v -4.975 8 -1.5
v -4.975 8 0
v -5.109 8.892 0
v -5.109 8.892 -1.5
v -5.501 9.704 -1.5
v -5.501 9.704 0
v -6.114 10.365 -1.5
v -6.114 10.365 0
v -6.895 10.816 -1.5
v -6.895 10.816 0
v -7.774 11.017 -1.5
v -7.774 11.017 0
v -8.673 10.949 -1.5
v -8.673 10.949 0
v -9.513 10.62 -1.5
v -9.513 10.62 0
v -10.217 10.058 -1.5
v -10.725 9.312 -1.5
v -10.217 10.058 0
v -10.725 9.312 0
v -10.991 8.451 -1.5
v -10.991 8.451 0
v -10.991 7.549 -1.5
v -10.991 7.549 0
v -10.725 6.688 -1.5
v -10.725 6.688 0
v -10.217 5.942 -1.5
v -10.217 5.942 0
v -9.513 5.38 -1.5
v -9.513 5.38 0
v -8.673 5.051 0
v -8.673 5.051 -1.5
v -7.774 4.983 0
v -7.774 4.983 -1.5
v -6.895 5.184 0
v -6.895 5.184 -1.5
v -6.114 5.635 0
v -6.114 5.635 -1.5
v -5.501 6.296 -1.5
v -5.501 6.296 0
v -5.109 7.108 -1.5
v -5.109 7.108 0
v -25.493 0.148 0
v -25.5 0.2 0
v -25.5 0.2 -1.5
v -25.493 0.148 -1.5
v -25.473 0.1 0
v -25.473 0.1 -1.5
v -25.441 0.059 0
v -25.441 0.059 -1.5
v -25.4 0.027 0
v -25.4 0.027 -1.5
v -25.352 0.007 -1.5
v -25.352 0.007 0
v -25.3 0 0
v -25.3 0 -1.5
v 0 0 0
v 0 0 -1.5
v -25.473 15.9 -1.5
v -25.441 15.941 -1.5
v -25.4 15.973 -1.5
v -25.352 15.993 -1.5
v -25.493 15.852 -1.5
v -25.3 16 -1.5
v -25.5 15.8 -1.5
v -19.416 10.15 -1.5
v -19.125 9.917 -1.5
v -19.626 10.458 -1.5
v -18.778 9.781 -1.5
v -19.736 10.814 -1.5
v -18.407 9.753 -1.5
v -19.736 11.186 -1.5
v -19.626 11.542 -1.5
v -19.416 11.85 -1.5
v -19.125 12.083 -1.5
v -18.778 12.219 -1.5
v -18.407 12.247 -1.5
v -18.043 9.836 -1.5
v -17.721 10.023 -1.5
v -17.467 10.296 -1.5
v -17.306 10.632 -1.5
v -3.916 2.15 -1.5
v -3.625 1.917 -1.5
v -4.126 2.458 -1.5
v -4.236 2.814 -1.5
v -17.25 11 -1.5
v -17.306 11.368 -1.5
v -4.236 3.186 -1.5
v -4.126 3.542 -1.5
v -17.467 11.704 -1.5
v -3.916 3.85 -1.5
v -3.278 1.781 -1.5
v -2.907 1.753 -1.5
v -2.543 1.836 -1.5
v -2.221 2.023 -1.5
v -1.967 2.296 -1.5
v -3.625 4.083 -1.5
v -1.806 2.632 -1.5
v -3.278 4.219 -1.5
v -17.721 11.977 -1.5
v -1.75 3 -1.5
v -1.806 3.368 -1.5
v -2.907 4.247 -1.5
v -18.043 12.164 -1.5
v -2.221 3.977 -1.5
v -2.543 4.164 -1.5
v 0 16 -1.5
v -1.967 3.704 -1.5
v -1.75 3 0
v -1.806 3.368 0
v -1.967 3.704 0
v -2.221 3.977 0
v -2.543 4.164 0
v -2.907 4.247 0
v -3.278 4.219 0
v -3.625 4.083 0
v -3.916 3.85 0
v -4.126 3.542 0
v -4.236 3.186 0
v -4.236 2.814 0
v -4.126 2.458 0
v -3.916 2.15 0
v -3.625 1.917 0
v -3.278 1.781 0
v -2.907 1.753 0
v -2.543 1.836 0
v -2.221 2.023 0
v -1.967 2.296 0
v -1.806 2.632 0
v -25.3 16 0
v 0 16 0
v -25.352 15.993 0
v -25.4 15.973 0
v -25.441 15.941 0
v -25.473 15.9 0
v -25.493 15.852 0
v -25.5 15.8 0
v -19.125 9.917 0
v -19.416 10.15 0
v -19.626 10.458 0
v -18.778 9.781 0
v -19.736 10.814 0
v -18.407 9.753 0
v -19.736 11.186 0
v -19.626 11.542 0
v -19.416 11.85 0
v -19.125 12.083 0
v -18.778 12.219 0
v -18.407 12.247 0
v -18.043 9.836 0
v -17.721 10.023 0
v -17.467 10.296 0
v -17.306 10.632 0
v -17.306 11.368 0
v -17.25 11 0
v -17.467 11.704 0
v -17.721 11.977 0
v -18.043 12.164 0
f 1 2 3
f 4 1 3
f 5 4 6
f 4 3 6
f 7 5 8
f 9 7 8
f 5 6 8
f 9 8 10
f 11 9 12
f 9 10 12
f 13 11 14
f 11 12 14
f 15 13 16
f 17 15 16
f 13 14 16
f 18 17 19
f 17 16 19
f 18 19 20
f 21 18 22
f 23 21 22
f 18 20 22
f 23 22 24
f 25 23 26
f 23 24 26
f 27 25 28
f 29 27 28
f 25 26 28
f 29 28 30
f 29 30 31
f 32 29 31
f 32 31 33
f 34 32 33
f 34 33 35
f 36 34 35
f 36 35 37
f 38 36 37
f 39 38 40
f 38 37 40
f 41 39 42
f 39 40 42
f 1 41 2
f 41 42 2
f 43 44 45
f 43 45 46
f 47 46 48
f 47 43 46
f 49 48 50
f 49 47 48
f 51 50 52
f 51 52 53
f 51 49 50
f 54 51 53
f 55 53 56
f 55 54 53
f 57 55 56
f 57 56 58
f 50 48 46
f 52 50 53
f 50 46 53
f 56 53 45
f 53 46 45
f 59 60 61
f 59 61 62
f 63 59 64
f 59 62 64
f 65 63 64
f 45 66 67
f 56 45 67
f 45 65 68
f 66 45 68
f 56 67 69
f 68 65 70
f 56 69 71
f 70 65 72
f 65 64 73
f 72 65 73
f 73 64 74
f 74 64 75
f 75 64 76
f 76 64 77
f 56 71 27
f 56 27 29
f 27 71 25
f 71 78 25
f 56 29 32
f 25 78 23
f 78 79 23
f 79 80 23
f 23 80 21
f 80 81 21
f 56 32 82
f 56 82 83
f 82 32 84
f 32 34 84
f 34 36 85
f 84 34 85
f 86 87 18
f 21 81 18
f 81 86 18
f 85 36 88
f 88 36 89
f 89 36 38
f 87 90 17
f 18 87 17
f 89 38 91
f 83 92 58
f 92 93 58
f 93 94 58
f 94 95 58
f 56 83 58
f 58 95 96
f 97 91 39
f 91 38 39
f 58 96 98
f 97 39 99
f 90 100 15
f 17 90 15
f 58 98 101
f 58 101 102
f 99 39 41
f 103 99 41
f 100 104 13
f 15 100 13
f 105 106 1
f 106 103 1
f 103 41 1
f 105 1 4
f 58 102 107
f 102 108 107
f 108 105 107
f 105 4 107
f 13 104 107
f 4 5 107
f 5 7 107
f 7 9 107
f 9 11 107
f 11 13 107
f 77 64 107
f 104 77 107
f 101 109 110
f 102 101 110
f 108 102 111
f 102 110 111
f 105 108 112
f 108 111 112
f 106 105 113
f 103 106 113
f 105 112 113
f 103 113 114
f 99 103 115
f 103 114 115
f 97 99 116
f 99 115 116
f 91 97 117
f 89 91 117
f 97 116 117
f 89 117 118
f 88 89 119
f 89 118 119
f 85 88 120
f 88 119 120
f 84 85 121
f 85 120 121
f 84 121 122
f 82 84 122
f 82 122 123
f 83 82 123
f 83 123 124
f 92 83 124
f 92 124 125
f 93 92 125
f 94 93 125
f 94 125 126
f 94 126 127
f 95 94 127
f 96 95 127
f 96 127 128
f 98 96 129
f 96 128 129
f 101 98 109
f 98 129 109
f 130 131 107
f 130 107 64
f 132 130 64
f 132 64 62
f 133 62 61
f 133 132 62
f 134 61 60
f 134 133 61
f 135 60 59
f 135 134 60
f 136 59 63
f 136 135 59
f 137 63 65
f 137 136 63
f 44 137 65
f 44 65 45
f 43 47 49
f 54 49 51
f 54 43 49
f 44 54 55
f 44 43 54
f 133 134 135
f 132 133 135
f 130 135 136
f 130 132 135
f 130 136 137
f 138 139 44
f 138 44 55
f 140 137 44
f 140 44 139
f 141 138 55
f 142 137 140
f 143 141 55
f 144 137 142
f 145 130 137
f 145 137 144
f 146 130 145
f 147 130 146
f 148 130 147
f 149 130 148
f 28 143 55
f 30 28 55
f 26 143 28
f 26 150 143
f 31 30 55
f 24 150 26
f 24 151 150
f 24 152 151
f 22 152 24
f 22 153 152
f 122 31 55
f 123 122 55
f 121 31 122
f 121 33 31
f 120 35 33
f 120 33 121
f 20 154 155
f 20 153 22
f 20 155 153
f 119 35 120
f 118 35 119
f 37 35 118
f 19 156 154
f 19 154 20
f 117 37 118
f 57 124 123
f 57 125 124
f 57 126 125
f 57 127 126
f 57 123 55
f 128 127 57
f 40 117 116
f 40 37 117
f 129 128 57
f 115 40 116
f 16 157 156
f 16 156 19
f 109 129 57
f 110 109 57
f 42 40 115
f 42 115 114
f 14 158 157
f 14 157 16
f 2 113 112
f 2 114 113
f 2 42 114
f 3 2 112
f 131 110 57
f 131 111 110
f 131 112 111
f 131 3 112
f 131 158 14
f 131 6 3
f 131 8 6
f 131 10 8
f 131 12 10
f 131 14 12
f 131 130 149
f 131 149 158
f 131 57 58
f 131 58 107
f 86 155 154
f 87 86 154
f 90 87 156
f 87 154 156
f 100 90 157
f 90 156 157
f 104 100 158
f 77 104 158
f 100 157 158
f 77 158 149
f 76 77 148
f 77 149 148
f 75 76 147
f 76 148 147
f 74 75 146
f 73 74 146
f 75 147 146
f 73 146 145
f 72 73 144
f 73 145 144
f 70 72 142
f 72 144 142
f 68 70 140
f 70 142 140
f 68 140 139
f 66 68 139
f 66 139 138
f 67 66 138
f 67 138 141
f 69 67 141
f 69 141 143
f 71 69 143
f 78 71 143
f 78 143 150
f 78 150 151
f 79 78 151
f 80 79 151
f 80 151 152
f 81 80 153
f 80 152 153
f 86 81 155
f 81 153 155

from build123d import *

# Parameters (mm, degrees)
SKETCH1_R          = 1.25
SKETCH1_R_2        = 3.025
BASE_FLANGE1_DEPTH = 1.5


# Sheet-metal steps are written as plain solids
with BuildPart() as part:
    # Sketch1 → Base-Flange1 (new body)
    with BuildSketch(Plane.XY):
        with BuildLine():
            Line((0, 16), (-25.3, 16))
            ThreePointArc((-25.3, 16), (-25.441421356, 15.941421356), (-25.5, 15.8))
            Line((-25.5, 15.8), (-25.5, 0.2))
            ThreePointArc((-25.5, 0.2), (-25.441421356, 0.058578644), (-25.3, 0))
            Line((-25.3, 0), (0, 0))
            Line((0, 0), (0, 16))
        make_face()
        with Locations((-3, 3)):
            Circle(SKETCH1_R, mode=Mode.SUBTRACT)
        with Locations((-8, 8)):
            Circle(SKETCH1_R_2, mode=Mode.SUBTRACT)
        with Locations((-18.5, 11)):
            Circle(SKETCH1_R, mode=Mode.SUBTRACT)
    extrude(amount=-BASE_FLANGE1_DEPTH)


solid = part.part
